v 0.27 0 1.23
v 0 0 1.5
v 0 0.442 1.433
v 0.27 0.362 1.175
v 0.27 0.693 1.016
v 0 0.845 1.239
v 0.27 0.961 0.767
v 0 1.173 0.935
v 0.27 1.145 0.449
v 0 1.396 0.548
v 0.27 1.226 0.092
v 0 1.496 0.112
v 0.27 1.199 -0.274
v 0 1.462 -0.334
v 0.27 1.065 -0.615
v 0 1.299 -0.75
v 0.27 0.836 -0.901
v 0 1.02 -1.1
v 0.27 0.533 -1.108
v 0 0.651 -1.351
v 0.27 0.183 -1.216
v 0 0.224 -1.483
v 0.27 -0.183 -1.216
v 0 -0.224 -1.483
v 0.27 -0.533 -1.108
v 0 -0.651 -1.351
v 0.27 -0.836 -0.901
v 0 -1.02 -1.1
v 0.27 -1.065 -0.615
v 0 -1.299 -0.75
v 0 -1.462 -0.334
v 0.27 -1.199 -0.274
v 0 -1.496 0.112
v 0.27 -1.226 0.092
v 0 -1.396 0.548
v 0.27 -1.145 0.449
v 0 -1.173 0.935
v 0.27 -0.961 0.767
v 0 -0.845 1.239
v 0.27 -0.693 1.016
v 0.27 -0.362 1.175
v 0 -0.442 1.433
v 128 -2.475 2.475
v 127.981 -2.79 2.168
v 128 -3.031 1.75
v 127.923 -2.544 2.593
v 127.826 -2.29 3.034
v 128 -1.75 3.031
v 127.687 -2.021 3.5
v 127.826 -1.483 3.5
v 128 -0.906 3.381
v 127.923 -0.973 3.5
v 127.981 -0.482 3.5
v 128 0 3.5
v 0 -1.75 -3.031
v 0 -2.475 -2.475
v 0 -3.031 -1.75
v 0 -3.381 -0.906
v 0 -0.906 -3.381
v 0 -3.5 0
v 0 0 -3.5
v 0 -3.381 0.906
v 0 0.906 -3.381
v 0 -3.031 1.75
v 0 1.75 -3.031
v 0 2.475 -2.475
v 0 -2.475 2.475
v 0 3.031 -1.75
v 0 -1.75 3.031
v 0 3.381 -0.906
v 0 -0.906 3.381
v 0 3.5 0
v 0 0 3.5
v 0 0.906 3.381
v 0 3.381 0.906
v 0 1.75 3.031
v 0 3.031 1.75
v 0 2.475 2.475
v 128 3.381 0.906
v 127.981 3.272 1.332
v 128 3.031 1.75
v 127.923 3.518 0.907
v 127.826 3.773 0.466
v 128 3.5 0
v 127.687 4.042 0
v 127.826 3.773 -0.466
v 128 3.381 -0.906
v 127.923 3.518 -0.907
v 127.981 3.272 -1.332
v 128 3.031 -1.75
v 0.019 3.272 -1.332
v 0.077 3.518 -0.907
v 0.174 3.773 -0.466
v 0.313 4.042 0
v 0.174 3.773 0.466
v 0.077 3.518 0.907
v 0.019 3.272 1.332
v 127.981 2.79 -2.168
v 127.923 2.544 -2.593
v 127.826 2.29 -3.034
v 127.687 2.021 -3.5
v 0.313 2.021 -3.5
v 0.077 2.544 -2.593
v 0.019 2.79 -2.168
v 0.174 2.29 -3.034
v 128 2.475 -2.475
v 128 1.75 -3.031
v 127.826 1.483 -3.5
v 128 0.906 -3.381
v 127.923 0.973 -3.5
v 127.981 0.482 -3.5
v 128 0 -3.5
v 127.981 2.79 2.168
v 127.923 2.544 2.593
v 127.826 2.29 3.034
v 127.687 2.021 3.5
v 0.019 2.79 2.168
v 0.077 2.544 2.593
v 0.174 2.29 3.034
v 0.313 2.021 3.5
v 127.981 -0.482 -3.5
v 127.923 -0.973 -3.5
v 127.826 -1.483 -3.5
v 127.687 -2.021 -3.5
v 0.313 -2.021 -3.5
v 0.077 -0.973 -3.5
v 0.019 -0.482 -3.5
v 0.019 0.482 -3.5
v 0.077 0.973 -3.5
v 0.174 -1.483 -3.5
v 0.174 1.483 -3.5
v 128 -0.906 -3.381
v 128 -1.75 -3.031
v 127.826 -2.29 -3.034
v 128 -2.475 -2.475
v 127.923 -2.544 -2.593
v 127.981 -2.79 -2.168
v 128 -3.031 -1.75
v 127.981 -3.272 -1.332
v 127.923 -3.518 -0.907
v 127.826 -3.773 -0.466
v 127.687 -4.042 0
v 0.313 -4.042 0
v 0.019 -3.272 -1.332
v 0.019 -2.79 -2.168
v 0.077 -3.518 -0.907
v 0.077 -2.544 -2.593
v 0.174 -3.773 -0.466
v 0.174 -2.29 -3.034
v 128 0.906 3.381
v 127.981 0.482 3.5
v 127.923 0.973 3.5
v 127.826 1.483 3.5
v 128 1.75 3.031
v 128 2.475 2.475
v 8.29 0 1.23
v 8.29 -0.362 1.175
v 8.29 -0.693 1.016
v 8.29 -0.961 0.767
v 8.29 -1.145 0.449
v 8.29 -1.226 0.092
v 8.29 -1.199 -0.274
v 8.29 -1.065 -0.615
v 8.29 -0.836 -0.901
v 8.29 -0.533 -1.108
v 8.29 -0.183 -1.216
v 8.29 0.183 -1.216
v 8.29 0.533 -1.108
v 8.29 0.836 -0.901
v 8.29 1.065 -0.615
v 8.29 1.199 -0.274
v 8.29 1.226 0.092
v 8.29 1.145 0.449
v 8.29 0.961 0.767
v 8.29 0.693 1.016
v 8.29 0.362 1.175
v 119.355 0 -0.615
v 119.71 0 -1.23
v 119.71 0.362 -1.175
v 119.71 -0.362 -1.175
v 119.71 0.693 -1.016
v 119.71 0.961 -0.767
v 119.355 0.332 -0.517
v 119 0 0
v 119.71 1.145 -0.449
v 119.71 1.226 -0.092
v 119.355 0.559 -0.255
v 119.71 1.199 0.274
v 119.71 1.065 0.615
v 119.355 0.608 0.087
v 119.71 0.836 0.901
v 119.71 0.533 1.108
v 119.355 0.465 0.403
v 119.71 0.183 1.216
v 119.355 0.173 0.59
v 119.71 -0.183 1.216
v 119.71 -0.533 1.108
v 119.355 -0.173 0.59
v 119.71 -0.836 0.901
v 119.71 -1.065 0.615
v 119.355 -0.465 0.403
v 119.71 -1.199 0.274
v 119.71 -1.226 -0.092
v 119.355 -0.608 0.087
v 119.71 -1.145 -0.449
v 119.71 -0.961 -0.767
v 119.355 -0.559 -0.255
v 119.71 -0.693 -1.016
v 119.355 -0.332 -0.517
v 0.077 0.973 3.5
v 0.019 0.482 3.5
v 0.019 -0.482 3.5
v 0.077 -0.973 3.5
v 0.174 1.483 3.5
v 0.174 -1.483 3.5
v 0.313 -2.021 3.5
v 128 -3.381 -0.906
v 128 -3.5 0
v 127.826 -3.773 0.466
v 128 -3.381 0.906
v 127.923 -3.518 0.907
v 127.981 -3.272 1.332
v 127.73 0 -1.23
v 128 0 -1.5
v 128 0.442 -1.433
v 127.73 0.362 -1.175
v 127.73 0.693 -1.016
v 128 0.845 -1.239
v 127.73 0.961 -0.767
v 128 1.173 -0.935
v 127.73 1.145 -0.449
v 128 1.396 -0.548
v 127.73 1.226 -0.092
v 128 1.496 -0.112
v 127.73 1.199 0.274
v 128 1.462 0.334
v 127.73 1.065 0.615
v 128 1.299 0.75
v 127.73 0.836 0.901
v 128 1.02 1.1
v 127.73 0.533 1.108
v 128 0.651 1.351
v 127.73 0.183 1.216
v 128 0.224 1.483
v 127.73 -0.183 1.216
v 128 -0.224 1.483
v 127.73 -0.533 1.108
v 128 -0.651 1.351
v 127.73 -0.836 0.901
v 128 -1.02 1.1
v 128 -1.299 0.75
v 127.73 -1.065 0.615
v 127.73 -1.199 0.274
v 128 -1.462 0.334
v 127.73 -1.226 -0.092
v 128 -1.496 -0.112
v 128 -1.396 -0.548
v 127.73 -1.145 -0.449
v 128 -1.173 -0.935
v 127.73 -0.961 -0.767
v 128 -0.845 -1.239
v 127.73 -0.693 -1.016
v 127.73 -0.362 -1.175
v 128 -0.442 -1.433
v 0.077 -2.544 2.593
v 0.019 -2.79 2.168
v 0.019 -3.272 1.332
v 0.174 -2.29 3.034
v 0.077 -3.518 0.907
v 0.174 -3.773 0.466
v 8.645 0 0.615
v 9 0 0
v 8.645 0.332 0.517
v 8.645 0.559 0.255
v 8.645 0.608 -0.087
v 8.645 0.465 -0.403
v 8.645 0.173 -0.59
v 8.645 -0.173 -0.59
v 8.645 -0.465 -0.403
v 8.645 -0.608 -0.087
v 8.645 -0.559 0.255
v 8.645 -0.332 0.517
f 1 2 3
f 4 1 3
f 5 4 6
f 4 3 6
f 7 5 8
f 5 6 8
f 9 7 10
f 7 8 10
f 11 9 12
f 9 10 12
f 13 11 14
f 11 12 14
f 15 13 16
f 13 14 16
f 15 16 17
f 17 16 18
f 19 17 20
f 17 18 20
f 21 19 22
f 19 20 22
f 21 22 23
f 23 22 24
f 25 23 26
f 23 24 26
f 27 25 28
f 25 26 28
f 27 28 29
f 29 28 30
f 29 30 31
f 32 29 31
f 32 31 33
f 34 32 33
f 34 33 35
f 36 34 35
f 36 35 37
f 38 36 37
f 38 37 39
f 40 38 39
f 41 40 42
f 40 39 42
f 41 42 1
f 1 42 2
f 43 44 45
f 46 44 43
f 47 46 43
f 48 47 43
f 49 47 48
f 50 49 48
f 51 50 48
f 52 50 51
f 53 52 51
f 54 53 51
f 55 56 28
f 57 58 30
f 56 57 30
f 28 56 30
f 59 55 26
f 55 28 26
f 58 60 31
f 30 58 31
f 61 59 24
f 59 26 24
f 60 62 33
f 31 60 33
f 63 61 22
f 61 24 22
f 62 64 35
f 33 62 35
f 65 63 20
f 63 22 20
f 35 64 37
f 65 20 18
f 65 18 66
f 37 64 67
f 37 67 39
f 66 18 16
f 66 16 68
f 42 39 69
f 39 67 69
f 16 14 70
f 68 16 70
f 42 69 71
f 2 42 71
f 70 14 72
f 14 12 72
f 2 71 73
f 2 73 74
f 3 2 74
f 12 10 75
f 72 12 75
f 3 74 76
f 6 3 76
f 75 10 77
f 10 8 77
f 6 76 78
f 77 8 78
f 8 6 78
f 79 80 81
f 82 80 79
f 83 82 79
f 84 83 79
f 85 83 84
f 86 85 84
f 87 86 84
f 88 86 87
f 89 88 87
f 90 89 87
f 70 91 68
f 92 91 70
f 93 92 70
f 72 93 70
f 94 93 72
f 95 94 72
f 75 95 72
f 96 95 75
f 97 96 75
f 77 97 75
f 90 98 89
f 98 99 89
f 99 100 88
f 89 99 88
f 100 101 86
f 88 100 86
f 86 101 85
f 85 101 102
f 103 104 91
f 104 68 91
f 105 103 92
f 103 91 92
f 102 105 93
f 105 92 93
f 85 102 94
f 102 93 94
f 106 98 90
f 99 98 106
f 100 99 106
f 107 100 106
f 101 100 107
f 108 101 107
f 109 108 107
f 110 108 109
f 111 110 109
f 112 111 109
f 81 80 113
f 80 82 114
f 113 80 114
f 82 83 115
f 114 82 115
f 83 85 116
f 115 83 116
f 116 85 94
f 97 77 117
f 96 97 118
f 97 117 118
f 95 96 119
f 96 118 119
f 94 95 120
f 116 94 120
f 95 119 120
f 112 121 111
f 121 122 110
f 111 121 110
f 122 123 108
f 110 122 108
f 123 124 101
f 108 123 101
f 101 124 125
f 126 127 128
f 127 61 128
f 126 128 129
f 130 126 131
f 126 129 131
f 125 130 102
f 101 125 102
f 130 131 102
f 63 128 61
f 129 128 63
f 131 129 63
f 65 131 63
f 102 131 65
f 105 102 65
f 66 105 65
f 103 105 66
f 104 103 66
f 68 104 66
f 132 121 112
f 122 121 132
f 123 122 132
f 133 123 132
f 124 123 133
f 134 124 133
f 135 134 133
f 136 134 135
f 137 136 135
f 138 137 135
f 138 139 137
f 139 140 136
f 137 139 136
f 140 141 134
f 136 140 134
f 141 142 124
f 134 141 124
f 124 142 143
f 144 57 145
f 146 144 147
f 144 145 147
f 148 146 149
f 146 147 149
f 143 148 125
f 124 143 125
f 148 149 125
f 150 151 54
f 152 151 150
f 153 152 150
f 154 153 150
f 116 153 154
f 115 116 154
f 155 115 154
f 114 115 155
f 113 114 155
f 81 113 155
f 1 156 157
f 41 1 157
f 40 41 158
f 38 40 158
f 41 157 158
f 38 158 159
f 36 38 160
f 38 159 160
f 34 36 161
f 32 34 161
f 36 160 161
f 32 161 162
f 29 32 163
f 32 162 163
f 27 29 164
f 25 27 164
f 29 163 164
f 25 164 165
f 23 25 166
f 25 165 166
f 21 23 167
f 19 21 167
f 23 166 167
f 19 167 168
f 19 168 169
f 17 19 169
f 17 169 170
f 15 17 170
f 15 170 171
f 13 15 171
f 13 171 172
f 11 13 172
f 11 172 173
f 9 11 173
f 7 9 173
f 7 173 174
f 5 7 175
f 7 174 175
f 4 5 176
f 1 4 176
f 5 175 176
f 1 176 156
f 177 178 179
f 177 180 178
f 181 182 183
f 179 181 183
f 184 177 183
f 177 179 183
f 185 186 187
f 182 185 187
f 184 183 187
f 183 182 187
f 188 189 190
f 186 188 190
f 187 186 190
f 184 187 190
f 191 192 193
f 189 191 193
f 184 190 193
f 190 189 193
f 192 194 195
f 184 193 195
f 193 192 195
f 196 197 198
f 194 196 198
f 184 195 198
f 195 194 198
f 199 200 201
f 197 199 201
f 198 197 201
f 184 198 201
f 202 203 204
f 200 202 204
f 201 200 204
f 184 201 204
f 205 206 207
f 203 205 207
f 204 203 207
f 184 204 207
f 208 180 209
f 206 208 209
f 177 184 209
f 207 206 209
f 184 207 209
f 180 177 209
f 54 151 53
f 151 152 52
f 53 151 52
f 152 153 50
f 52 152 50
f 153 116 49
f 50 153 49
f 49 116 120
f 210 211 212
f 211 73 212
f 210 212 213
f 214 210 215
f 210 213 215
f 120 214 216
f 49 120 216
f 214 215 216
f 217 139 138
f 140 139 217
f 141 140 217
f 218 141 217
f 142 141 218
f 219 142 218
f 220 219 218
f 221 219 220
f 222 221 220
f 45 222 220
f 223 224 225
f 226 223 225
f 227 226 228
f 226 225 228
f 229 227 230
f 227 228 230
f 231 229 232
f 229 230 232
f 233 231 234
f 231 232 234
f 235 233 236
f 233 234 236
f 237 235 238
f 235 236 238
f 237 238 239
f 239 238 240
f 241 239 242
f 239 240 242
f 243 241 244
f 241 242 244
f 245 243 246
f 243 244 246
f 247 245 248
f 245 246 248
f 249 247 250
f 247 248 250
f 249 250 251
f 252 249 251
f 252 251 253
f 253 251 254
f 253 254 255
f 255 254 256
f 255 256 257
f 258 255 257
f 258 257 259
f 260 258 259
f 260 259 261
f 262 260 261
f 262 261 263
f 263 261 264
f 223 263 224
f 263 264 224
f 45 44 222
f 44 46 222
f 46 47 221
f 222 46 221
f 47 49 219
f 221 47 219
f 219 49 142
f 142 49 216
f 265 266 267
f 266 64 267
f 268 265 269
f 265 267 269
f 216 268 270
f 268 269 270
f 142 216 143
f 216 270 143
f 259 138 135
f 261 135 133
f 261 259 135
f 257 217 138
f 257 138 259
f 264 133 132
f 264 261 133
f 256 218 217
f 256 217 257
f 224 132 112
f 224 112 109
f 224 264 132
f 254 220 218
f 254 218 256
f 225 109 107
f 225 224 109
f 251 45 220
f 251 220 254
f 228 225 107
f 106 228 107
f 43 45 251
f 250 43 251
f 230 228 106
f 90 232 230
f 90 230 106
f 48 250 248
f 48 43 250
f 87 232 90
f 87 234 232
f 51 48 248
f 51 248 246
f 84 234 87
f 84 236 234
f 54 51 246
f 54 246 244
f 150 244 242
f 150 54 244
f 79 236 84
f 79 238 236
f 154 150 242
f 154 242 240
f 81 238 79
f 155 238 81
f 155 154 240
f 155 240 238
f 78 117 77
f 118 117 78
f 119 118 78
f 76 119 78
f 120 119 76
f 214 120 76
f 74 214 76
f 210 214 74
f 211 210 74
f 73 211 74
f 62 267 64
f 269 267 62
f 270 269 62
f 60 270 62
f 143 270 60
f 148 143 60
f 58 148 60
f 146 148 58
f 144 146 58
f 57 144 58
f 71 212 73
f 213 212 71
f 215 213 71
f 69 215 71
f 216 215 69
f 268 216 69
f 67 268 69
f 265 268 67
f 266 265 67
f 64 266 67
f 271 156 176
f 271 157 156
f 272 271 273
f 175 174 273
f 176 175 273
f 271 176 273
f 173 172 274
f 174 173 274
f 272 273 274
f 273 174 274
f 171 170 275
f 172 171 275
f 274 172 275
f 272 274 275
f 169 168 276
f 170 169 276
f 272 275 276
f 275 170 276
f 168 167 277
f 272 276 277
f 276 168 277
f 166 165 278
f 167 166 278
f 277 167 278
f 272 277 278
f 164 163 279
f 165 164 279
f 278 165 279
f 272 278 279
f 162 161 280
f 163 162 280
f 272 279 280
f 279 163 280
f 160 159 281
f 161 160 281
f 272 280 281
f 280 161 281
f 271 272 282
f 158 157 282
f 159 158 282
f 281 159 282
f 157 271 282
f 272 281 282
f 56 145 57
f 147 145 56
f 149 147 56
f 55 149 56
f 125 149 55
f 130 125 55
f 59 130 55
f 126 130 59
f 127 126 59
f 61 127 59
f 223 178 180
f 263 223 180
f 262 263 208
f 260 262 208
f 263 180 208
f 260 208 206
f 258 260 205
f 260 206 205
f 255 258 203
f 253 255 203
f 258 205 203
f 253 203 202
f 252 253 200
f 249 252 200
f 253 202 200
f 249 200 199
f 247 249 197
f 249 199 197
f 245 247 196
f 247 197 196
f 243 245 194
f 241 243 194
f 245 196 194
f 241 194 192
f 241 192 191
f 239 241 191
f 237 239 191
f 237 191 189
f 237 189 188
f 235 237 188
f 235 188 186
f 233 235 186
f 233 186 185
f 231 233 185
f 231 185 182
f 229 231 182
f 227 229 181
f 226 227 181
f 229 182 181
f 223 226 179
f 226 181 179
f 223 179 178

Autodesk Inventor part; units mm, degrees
sketch "Sketch_1" plane through (0, 0, 0) normal (0, 0, 1) x (1, 0, 0)
  line L0 (128, 0) -> (0, 0)
  line L1 (0, 0) -> (0, 3.5)
  line L2 (0, 3.5) -> (0.6062, 4.55)
  line L3 (0.6062, 4.55) -> (127.3938, 4.55)
  line L4 (127.3938, 4.55) -> (128, 3.5)
  line L5 (128, 3.5) -> (128, 0)
  line L6 (128, 0) -> (0, 0)
revolve "Revolution1" add sketch "Sketch_1" angle 360 about axis through (128, 0, 0) along (1, 0, 0)
sketch "Sketch_2" plane through (0, 0, 0) normal (1, 0, 0) x (0, 1, 0)
  line L0 (7, 7) -> (-7, 7)
  line L1 (-7, 7) -> (-7, -7)
  line L2 (-7, -7) -> (7, -7)
  line L3 (7, -7) -> (7, 7)
  line L4 (-2.0207, 3.5) -> (-4.0415, 0)
  line L5 (-4.0415, 0) -> (-2.0207, -3.5)
  line L6 (-2.0207, -3.5) -> (2.0207, -3.5)
  line L7 (2.0207, -3.5) -> (4.0415, 0)
  line L8 (4.0415, 0) -> (2.0207, 3.5)
  line L9 (2.0207, 3.5) -> (-2.0207, 3.5)
extrude "Extrusion1" cut sketch "Sketch_2" along normal blind 128
sketch "Sketch3" plane through (0, 0, 0) normal (-1, 0, 0) x (0, 0, 1)
  point P0 (0, 0)
hole "Hole1" at (0, 0, 0) direction (1, 0, 0) diameter 2.459 depth 8.2901 tip angle 120 countersink diameter 3 countersink angle 90 thread size "M3x0.5" class "6H" standard "ISO Metric profile"
sketch "Sketch4" plane through (128, 0, 0) normal (1, 0, 0) x (0, 0, -1)
  point P0 (0, 0)
hole "Hole2" at (128, 0, 0) direction (-1, 0, 0) diameter 2.459 depth 8.2901 tip angle 120 countersink diameter 3 countersink angle 90 thread size "M3x0.5" class "6H" standard "ISO Metric profile"
ref_plane "C3_XY" through (128, 0, 0) normal (-1, 0, 0) x (0, 0, -1)
ref_plane "C3_YZ" through (128, 0, 0) normal (0, 0, -1) x (0, -1, 0)
ref_plane "C3_ZX" through (128, 0, 0) normal (0, -1, 0) x (-1, 0, 0)
properties part number "SLSBF7-128-M3-N3" material "ステンレス鋼 AISI 304"
